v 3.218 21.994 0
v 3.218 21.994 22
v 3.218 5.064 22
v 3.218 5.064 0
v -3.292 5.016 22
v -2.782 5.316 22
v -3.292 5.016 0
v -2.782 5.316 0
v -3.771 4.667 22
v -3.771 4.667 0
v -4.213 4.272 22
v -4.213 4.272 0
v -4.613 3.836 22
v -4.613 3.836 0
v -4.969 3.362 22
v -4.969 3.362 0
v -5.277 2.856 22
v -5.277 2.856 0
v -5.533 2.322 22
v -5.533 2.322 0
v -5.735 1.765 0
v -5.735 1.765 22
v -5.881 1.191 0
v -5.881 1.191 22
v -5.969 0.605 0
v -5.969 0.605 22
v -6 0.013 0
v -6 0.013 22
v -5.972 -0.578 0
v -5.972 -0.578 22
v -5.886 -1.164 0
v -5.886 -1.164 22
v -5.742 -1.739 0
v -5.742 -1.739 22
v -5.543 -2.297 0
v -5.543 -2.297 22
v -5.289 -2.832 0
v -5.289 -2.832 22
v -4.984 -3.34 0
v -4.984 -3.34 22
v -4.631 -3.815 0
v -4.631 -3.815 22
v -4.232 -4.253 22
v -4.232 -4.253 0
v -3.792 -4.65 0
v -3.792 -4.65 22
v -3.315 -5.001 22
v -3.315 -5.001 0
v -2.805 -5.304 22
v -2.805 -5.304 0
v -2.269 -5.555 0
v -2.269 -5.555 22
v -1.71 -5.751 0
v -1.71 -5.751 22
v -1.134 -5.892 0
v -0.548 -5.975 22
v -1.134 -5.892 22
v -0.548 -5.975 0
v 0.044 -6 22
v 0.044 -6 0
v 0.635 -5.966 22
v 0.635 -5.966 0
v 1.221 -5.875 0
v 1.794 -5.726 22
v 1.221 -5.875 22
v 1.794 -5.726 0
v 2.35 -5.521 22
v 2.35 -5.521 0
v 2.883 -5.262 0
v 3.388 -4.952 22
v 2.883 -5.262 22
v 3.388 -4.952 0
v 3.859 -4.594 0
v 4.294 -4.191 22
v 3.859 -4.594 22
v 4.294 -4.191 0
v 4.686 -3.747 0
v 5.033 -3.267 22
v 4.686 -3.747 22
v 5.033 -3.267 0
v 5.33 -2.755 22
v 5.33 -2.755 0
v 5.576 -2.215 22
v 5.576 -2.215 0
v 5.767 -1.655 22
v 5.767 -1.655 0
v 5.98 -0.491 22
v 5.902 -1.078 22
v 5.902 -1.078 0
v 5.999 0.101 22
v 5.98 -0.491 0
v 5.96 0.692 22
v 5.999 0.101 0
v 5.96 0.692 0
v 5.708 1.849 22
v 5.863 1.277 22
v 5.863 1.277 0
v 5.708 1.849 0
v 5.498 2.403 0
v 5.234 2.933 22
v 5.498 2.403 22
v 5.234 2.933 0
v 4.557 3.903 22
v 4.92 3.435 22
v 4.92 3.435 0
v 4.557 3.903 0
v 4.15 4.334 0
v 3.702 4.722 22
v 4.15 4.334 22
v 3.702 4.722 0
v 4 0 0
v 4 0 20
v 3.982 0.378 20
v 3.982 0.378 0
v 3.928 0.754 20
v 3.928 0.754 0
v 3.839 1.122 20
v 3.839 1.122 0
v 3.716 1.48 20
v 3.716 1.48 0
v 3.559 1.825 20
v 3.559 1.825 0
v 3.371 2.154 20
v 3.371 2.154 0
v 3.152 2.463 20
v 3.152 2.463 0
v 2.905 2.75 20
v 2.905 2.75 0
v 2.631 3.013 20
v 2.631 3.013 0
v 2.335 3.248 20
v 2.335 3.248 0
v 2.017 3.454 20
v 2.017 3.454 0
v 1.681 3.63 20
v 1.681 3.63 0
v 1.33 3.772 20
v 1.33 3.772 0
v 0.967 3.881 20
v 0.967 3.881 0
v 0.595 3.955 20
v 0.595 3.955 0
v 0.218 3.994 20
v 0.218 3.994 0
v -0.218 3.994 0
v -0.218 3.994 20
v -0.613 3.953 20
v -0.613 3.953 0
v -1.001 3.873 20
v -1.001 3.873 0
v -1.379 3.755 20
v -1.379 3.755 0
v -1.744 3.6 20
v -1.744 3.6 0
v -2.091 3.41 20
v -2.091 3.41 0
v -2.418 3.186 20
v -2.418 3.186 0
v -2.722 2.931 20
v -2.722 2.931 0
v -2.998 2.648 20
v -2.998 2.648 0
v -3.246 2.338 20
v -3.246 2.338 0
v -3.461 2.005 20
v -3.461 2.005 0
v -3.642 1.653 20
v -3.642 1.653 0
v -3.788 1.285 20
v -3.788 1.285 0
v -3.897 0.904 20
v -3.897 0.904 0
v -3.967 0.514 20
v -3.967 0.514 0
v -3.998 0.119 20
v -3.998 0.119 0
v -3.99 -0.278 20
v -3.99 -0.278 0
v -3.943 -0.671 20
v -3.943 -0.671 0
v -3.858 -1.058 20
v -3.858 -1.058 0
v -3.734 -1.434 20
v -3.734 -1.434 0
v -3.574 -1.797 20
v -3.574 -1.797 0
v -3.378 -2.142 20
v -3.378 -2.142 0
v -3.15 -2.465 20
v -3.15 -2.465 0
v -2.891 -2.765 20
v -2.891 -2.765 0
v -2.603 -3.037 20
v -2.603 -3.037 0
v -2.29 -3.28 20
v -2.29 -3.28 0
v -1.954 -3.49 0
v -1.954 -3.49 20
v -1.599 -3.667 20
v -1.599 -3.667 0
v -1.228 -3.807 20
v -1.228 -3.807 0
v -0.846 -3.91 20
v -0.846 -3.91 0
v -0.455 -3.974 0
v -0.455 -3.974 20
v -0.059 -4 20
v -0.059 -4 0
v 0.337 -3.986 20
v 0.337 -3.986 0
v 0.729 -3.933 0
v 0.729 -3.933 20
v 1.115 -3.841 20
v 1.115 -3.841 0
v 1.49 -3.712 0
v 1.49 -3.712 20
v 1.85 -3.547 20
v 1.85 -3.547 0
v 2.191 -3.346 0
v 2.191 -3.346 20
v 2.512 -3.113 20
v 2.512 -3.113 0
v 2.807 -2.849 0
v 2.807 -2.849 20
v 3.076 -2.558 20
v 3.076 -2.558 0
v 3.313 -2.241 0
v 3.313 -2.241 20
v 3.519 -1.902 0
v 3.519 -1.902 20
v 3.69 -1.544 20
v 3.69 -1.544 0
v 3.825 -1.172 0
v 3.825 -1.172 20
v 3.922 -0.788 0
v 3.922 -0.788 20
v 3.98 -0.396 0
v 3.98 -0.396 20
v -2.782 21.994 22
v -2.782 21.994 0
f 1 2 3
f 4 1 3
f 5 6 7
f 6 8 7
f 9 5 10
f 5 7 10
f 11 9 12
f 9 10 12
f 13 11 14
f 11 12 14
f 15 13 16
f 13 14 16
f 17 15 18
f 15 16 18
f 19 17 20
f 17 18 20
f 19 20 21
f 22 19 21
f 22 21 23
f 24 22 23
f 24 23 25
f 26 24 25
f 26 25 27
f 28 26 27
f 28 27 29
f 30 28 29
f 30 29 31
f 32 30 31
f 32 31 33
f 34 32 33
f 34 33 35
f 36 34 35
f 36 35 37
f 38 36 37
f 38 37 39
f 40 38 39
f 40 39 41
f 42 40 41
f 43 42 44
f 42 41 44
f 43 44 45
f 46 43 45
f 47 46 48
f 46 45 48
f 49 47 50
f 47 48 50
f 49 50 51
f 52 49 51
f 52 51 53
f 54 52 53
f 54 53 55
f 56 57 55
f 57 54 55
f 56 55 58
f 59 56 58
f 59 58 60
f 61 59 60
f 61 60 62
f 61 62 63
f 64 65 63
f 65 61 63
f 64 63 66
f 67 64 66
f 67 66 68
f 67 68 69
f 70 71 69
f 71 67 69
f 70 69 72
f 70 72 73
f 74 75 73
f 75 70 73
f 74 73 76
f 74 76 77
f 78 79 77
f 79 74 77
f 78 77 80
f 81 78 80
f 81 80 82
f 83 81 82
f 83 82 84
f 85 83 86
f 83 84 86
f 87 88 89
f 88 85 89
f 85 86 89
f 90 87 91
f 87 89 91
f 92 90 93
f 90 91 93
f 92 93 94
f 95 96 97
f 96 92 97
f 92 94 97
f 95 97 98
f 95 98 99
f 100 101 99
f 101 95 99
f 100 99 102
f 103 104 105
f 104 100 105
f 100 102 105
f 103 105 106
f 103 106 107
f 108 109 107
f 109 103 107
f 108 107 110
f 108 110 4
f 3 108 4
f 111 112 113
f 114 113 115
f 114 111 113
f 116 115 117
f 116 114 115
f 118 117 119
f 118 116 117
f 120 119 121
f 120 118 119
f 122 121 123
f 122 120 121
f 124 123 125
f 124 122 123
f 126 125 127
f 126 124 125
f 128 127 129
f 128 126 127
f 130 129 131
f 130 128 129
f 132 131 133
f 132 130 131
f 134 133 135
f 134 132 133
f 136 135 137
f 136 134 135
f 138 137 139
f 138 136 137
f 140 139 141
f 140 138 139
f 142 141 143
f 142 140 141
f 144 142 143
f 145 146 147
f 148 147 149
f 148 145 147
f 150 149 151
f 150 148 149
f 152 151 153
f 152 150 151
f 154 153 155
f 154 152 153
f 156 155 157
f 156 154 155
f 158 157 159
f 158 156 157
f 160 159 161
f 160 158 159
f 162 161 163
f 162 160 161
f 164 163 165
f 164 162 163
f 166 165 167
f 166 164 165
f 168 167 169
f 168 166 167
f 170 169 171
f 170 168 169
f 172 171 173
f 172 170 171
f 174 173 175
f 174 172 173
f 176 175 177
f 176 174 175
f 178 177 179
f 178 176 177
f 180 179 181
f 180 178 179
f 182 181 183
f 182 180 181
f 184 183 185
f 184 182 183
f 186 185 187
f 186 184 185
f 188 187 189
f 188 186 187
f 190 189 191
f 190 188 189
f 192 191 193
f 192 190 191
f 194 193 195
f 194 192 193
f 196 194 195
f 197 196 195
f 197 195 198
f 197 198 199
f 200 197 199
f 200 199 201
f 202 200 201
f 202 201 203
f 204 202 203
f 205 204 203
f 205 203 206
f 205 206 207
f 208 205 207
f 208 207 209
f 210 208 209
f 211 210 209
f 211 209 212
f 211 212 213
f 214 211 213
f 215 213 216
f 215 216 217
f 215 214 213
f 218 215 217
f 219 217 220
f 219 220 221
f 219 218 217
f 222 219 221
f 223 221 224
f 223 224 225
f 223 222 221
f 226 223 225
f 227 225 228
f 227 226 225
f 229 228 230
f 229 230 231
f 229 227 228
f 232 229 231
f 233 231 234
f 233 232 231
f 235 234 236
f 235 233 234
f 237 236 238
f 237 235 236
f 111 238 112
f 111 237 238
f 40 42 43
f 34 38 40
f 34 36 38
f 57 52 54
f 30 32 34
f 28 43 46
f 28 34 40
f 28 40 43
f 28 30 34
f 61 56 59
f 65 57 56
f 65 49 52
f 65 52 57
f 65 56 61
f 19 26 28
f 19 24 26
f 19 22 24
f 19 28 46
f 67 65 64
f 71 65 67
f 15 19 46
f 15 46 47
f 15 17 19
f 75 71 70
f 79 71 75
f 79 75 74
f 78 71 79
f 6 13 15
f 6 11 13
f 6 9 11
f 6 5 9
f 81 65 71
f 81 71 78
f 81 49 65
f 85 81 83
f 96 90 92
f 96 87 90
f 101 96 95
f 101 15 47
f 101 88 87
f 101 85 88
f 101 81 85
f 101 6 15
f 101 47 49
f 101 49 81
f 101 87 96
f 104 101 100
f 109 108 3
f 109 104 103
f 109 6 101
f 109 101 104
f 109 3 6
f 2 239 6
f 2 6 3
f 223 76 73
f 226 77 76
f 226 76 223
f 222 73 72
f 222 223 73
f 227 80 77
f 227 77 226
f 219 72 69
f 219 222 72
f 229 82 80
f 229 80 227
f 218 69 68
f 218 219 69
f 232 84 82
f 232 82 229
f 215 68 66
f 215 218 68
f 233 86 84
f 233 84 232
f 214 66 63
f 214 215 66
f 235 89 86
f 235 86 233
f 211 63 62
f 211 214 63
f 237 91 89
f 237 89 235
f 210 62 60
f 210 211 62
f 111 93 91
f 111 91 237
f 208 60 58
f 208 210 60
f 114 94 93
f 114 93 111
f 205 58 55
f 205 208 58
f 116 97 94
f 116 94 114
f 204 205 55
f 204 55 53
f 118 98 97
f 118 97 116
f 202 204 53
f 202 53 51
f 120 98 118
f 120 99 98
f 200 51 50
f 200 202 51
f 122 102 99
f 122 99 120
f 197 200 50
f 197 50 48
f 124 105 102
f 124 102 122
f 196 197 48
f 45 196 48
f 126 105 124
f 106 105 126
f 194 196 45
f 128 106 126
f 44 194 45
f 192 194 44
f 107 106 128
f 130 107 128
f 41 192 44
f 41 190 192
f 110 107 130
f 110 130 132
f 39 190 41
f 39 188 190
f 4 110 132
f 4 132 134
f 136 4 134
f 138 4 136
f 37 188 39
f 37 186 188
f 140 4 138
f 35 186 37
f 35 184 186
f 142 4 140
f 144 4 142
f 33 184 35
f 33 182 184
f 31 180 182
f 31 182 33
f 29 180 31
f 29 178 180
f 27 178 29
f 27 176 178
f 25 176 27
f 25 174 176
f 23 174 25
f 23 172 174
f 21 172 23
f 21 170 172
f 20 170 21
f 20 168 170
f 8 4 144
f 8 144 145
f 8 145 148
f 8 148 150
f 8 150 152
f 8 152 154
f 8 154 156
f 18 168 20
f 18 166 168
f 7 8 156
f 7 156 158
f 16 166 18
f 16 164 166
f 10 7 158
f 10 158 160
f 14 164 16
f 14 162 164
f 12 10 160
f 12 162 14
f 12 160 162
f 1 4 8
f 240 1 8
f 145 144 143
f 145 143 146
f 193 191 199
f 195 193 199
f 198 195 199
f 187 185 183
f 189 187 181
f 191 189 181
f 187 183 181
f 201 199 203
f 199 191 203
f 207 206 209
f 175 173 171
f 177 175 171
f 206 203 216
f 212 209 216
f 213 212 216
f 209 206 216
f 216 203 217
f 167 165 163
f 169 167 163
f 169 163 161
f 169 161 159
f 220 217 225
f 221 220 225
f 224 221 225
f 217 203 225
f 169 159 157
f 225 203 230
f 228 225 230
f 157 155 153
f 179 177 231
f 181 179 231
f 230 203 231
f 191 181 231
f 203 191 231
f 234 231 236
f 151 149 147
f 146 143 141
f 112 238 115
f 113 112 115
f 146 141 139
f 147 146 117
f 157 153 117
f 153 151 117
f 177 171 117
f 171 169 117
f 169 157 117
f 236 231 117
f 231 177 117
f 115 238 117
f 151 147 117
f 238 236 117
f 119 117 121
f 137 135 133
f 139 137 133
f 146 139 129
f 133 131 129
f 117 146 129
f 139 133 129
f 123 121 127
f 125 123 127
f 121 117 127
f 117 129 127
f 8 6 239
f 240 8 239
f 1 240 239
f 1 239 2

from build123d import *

# Parameters (mm, degrees)
CROQUIS1_R              = 6
CROQUIS1_R_2            = 4
SALIENTE_EXTRUIR1_DEPTH = 20
CROQUIS2_R              = 6
SALIENTE_EXTRUIR2_DEPTH = 2
SALIENTE_EXTRUIR3_REACH = 25.58


with BuildPart() as part:
    # Croquis1 → Saliente-Extruir1 (new body)
    with BuildSketch(Plane.XY):
        Circle(CROQUIS1_R)
        Circle(CROQUIS1_R_2, mode=Mode.SUBTRACT)
    extrude(amount=SALIENTE_EXTRUIR1_DEPTH)

    # Croquis2 → Saliente-Extruir2 (add)
    with BuildSketch(Plane.XY.offset(20)):
        Circle(CROQUIS2_R)
    extrude(amount=SALIENTE_EXTRUIR2_DEPTH)

    # Saliente-Extruir3: up to this face of the body (flat: up to its plane)
    saliente_extruir3_end = Plane(part.part.faces().sort_by_distance((0, 0, 22))[0])
    # Croquis3 → Saliente-Extruir3 (add, up to the picked face)
    with BuildSketch(Plane(origin=(0, 0, 0), x_dir=(-1, 0, 0), z_dir=(0, 0, -1)), mode=Mode.PRIVATE) as saliente_extruir3_sk1:
        Polygon((-0.21844428, 21.994030808), (-3.21844428, 21.994030808), (-3.21844428, 3.994030808), (2.78155572, 3.994030808), (2.78155572, 21.994030808), align=None)
    saliente_extruir3_tool1 = split(extrude(saliente_extruir3_sk1.sketch, amount=-SALIENTE_EXTRUIR3_REACH, mode=Mode.PRIVATE), bisect_by=saliente_extruir3_end, keep=Keep.BOTH, mode=Mode.PRIVATE)
    add(saliente_extruir3_tool1.solids().sort_by(Axis((0.218444, 12.994031, 0), (0, 0, 1)))[0])


solid = part.part
